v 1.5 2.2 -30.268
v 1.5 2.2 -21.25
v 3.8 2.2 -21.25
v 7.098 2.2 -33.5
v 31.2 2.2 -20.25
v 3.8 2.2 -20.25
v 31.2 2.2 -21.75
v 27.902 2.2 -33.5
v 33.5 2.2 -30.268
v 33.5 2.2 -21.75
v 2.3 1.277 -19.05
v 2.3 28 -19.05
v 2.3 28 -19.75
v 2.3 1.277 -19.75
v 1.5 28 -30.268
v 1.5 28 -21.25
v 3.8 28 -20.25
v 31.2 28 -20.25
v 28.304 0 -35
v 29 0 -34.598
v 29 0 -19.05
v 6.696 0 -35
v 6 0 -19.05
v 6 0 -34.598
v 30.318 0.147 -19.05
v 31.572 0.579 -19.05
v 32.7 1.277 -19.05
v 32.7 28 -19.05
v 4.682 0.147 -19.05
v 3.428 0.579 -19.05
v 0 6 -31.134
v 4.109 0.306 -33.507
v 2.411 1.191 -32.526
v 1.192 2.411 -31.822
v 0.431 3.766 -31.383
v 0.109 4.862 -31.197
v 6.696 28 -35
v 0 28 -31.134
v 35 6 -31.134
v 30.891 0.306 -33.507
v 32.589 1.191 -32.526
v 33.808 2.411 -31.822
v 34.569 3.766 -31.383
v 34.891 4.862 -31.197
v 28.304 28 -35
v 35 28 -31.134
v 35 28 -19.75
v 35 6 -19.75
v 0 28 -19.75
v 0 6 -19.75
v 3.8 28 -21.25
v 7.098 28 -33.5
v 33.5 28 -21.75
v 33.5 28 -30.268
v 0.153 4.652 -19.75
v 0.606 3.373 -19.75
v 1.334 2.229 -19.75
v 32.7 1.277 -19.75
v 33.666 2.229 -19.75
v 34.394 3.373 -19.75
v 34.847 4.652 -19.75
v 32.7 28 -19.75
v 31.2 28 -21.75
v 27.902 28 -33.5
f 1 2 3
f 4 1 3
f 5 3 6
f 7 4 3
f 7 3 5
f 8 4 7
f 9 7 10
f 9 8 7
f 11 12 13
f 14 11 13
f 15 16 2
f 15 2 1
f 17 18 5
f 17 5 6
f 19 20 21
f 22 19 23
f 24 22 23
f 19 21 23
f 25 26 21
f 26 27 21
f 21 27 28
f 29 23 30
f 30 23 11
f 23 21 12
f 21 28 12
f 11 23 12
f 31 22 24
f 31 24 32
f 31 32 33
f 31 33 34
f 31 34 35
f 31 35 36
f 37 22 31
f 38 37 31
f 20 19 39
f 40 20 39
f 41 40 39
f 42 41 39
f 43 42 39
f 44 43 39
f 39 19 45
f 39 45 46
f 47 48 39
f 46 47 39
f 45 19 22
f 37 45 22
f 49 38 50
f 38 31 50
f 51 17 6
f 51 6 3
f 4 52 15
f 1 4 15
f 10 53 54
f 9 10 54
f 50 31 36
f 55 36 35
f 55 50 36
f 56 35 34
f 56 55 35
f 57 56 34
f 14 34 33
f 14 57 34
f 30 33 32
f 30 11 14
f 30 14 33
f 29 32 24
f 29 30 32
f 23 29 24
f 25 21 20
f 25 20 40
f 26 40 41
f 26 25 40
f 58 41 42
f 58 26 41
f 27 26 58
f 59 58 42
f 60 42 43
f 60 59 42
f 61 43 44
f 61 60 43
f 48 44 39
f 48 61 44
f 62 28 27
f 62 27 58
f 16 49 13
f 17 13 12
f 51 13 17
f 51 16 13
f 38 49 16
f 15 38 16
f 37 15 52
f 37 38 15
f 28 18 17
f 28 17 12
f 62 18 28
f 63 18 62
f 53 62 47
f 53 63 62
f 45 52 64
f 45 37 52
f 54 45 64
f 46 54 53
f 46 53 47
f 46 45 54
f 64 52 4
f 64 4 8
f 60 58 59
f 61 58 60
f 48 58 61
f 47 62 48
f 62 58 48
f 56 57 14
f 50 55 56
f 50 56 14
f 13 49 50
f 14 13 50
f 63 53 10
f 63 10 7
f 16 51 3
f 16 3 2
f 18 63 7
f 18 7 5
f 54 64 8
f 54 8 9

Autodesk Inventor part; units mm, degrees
ref_plane "YZ Plane" through (0, 0, 0) normal (1, 0, 0) x (0, 1, 0)
ref_plane "XZ Plane" through (0, 0, 0) normal (0, 1, 0) x (-1, 0, 0)
ref_plane "XY Plane" through (0, 0, 0) normal (0, 0, 1) x (1, 0, 0)
sketch "Sketch1" plane through (0, 0, 0) normal (0, 1, 0) x (-1, 0, 0)
  line L0 (0, 0) -> (-35, 0)
  line L1 (-35, 0) -> (-35, -35)
  line L2 (-35, -35) -> (0, -35)
  line L3 (0, -35) -> (0, 0)
  dimension "d0" = 35
  dimension "d1" = 35
extrude "Extrusion1" add sketch "Sketch1" along normal blind 28
sketch "Sketch2" plane through (0, 28, 0) normal (0, 1, 0) x (1, 0, 0)
  line L0 (35, 19) -> (32.7, 19)
  line L1 (32.7, 19) -> (32.7, 17)
  line L2 (35, 19) -> (35, 17.125)
  line L3 (32.7, 17) -> (35, 17)
  line L4 (35, 17) -> (35, 17.125)
  point P0 (0, 0)
  point P1 (35, 35)
  dimension "d6" = 16
  dimension "d7" = 2.3
  dimension "d8" = 2
extrude "Extrusion2" cut sketch "Sketch2" against normal blind 28
pattern_linear "Rectangular Pattern1" count 2 spacing 32.7 along (-1, 0, 0) of "Extrusion2"
fillet "Fillet1" radius 6 2 edges at (35, 0, -8.5) (35, 0, -27)
fillet "Fillet2" radius 6 1 edges at (0, 0, -27)
sketch "Sketch3" plane through (0, 28, 0) normal (0, 1, 0) x (1, 0, 0)
  line L0 (6, 0) -> (0, 0) projected
  line L1 (0, 0) -> (0, 3)
  line L2 (0, 17) -> (0, 0) projected
  line L3 (0, 0) -> (3, 0)
  line L4 (0, 3) -> (3, 0)
  dimension "d16" = 3
extrude "Extrusion3" cut sketch "Sketch3" against normal blind 28
sketch "Sketch4" plane through (0, 28, 0) normal (0, 1, 0) x (1, 0, 0)
  line L0 (0, 19) -> (0, 35) projected
  line L1 (0, 35) -> (0, 32)
  line L2 (0, 35) -> (6, 35) projected
  line L3 (0, 35) -> (3, 35)
  line L4 (3, 35) -> (0, 32)
  point P0 (0, 0)
  dimension "d19" = 3
  dimension "d20" = 3
extrude "Extrusion4" cut sketch "Sketch4" against normal blind 28
sketch "Sketch5" plane through (0, 28, 0) normal (0, 1, 0) x (1, 0, 0)
  line L0 (35, 0) -> (35, 17) projected
  line L1 (35, 0) -> (32, 0)
  line L2 (3, 0) -> (35, 0) projected
  line L3 (35, 0) -> (35, 3)
  line L4 (35, 3) -> (32, 0)
  line L5 (29, 35) -> (35, 35) projected
  line L6 (35, 35) -> (35, 32)
  line L7 (35, 19) -> (35, 35) projected
  line L8 (35, 32) -> (32, 35)
  line L9 (32, 35) -> (35, 35)
  point P0 (0, 0)
  dimension "d23" = 3
  dimension "d24" = 3
  dimension "d25" = 3
extrude "Extrusion5" cut sketch "Sketch5" against normal blind 28
sketch "Sketch6" plane through (0, 28, 0) normal (0, 1, 0) x (1, 0, 0)
  line L0 (3, 0) -> (0, 3) projected
  line L1 (2.3, 17) -> (0, 17) projected
  line L2 (2, 15.75) -> (4.3, 15.75)
  line L3 (4.3, 15.75) -> (4.3, 21.75)
  line L4 (4.3, 21.75) -> (2, 21.75)
  line L5 (0, 19) -> (0, 32) projected
  line L6 (2, 21.75) -> (2, 30.75)
  line L7 (0, 3) -> (0, 5)
  line L8 (0, 17) -> (0, 3) projected
  line L9 (2, 5) -> (2, 15.75)
  line L10 (32, 35) -> (3, 35) projected
  line L11 (3, 35) -> (5, 35)
  line L12 (6, 0) -> (3, 0) projected
  line L13 (3, 0) -> (5, 0)
  line L14 (2.827, 3) -> (2, 3.8818)
  line L15 (2, 3.8818) -> (2, 5)
  line L16 (2.827, 3) -> (3.827, 2)
  line L17 (2.827, 3) -> (4.2412, 3) construction
  line L18 (1.743, 34.4232) -> (3.15, 33.0019)
  line L19 (3.15, 33.0019) -> (2, 31.8635)
  line L20 (2, 31.8635) -> (2, 30.75)
  line L21 (3.15, 33.0019) -> (4.0351, 33.5429)
  line L22 (4.0351, 33.5429) -> (30.1293, 33.5429)
  line L23 (35, 32) -> (32, 35) projected
  line L24 (32.0858, 32.8358) -> (31.3787, 33.5429)
  line L25 (31.3787, 33.5429) -> (30.1293, 33.5429)
  line L26 (35, 19) -> (35, 32) projected
  line L27 (33, 26.25) -> (33, 31.9216)
  line L28 (33, 31.9216) -> (32.0858, 32.8358)
  line L29 (33, 26.25) -> (33, 21.75)
  line L30 (35, 19) -> (32.7, 19) projected
  line L31 (33, 21.75) -> (30.7, 21.75)
  line L32 (30.7, 21.75) -> (30.7, 15.75)
  line L33 (30.7, 15.75) -> (33, 15.75)
  line L34 (33, 15.75) -> (33, 7.3052)
  line L35 (32, 0) -> (35, 3) projected
  line L36 (33.85, 1.85) -> (35.85, 1.85) construction
  line L37 (32.4358, 3.2642) -> (33, 3.8284)
  line L38 (33, 3.8284) -> (33, 7.3052)
  line L39 (27.667, 2) -> (31.1716, 2)
  line L40 (31.1716, 2) -> (32.4358, 3.2642)
  line L41 (27.667, 2) -> (3.827, 2)
  point P0 (0, 0)
  dimension "d31" = 2.3
  dimension "d32" = 6
  dimension "d33" = 2.3
  dimension "d34" = 9
  dimension "d35" = 2
  dimension "d36" = 2
  dimension "d37" = 2
  dimension "d42" = 45
  dimension "d43" = 2
  dimension "d48" = 4.5
  dimension "d49" = 2.3
  dimension "d50" = 6
  dimension "d51" = 2.3
  dimension "d52" = 2
extrude "Extrusion6" cut sketch "Sketch6" against normal blind 25.8
sketch "Sketch7" plane through (0, 28, 0) normal (0, 1, 0) x (1, 0, 0)
  line L0 (23.4542, 2) -> (23.9542, 2) construction
  line L1 (32.0858, 2.9142) -> (32.5858, 2.9142) construction
  line L2 (35, 32) -> (32, 35) projected
  line L3 (31.3787, 33.5429) -> (33, 31.9216) projected
  line L4 (2, 31.8635) -> (3.15, 33.0019) projected
  line L5 (2.8776, 32.7322) -> (3.3776, 32.7322) construction
  line L6 (32.4393, 2.5607) -> (31.3787, 1.5)
  line L7 (31.3787, 1.5) -> (23.4542, 1.5)
  line L8 (2.7741, 2.5108) -> (3.7848, 1.5)
  line L9 (3.7848, 1.5) -> (23.4542, 1.5)
  line L10 (2.7741, 2.5108) -> (1.5, 3.7848)
  line L11 (1.5, 3.7848) -> (1.5, 16.2498)
  line L12 (1.5, 16.2498) -> (3.8, 16.2498)
  line L13 (3.8, 16.2498) -> (3.8, 21.2498)
  line L14 (4.3, 21.75) -> (2, 21.75) projected
  line L15 (3.8, 21.2498) -> (1.5, 21.2498)
  line L16 (1.5, 21.2498) -> (1.5, 27.2918)
  line L17 (1.5, 27.2918) -> (1.5, 32.0617)
  line L18 (1.5, 32.0617) -> (2.5241, 33.0858)
  line L19 (2.5241, 33.0858) -> (3.4812, 34.0429)
  line L20 (3.4812, 34.0429) -> (18.3245, 34.0429)
  line L21 (18.3245, 34.0429) -> (31.5858, 34.0429)
  line L22 (31.5858, 34.0429) -> (32.5429, 33.0858)
  line L23 (32.4393, 2.5607) -> (33.5, 3.6213)
  line L24 (33.5, 3.6213) -> (33.5, 11.0333)
  line L25 (33.5, 11.0333) -> (33.5, 16.2503)
  line L26 (33.5, 16.2503) -> (31.2, 16.2503)
  line L27 (30.7, 21.75) -> (30.7, 15.75) projected
  line L28 (31.2, 16.2503) -> (31.2, 21.2503)
  line L29 (31.2, 21.2503) -> (33.5, 21.2503)
  line L30 (33.5, 21.2503) -> (33.5, 32.1287)
  line L31 (33.5, 32.1287) -> (32.5429, 33.0858)
  line L32 (4.0351, 33.5429) -> (31.3787, 33.5429) projected
  line L33 (4.0351, 33.5429) -> (31.3787, 33.5429)
  line L34 (33, 31.9216) -> (33, 21.75) projected
  line L35 (31.3787, 33.5429) -> (33, 31.9216)
  line L36 (33, 31.9216) -> (33, 21.75)
  line L37 (33, 21.75) -> (30.7, 21.75) projected
  line L38 (33, 21.75) -> (30.7, 21.75)
  line L39 (30.7, 21.75) -> (30.7, 15.75)
  line L40 (30.7, 15.75) -> (33, 15.75) projected
  line L41 (31.1716, 2) -> (3.827, 2)
  line L42 (3.827, 2) -> (2.827, 3) projected
  line L43 (2, 3.8818) -> (2, 15.75) projected
  line L44 (3.827, 2) -> (2, 3.8818)
  line L45 (2, 3.8818) -> (2, 15.75)
  line L46 (2, 15.75) -> (4.3, 15.75) projected
  line L47 (2, 15.75) -> (4.3, 15.75)
  line L48 (4.3, 15.75) -> (4.3, 21.75) projected
  line L49 (4.3, 15.75) -> (4.3, 21.75)
  line L50 (4.3, 21.75) -> (2, 21.75)
  line L51 (2, 21.75) -> (2, 31.8635) projected
  line L52 (2, 21.75) -> (2, 31.8635)
  line L53 (3.15, 33.0019) -> (4.0351, 33.5429) projected
  line L54 (2, 31.8635) -> (3.15, 33.0019)
  line L55 (33, 3.8284) -> (31.1716, 2) projected
  line L56 (31.1716, 2) -> (33, 3.8284)
  line L57 (33, 3.8284) -> (33, 15.75)
  line L58 (30.7, 15.75) -> (33, 15.75)
  point P0 (0, 0)
  dimension "d65" = 0.5
  dimension "d70" = 12.465
  dimension "d71" = 2.3
  dimension "d72" = 5
  dimension "d73" = 90
  dimension "d74" = 2.3
  dimension "d76" = 2.3
  dimension "d77" = 5
  dimension "d78" = 2.3
extrude "Extrusion7" cut sketch "Sketch7" against normal blind 25.8
sketch "Sketch8" plane through (0, 28, 0) normal (0, 1, 0) x (1, 0, 0)
  line L0 (32, 35) -> (35, 32) projected
  line L1 (33.2498, 33.7502) -> (34.7498, 33.7502) construction
  line L2 (29, 35) -> (32, 35) projected
  line L3 (28.3787, 33.5) -> (31.3787, 33.5)
  line L4 (31.3787, 33.5) -> (32.1892, 32.6895)
  line L5 (33.5, 32.1287) -> (33.5, 21.2503) projected
  line L6 (33.5, 31.3787) -> (32.1892, 32.6895)
  line L7 (33.5, 31.3787) -> (33.5, 32.1287)
  line L8 (31.5858, 34.0429) -> (33.5, 32.1287) projected
  line L9 (33.5, 32.1287) -> (31.5858, 34.0429)
  line L10 (3.4812, 34.0429) -> (31.5858, 34.0429) projected
  line L11 (31.5858, 34.0429) -> (3.4812, 34.0429)
  line L12 (1.5, 32.0617) -> (3.4812, 34.0429) projected
  line L13 (3.4812, 34.0429) -> (1.5, 32.0617)
  line L14 (3, 35) -> (0, 32) projected
  line L15 (1.7099, 33.7099) -> (3.2099, 33.7099) construction
  line L16 (2.7705, 32.6492) -> (1.5, 31.3787)
  line L17 (1.5, 21.2498) -> (1.5, 32.0617) projected
  line L18 (4.3449, 35) -> (5.8449, 35) construction
  line L19 (4.3449, 33.5) -> (3.6213, 33.5)
  line L20 (3.6213, 33.5) -> (2.7705, 32.6492)
  line L21 (1.5, 31.3787) -> (1.5, 32.0617)
  line L22 (4.3449, 33.5) -> (28.3787, 33.5)
  point P0 (0, 0)
  dimension "d83" = 1.5
  dimension "d87" = 1.5
  dimension "d89" = 1.5
extrude "Extrusion8" add sketch "Sketch8" against normal blind 25.8
sketch "Sketch9" plane through (0, 28, 0) normal (0, 1, 0) x (1, 0, 0)
  line L0 (0, 3) -> (3, 0) projected
  line L1 (0, 3) -> (5.1962, 0)
  line L2 (3, 0) -> (32, 0) projected
  line L3 (0, 3) -> (6, 3) construction
  line L4 (5.1962, 0) -> (3, 0)
  line L5 (3, 0) -> (0, 3)
  line L6 (35, 17) -> (35, 3) projected
  line L7 (35, 3) -> (29.8038, 0)
  line L8 (32, 0) -> (29, 0) projected
  line L9 (35, 3) -> (41, 3) construction
  line L10 (29.8038, 0) -> (32, 0)
  line L11 (32, 0) -> (35, 3)
  line L12 (35, 19) -> (35, 32) projected
  line L13 (35, 32) -> (29.8038, 35)
  line L14 (29, 35) -> (32, 35) projected
  line L15 (35, 32) -> (41, 32) construction
  line L16 (29.8038, 35) -> (32, 35)
  line L17 (32, 35) -> (35, 32)
  line L18 (0, 19) -> (0, 32) projected
  line L19 (0, 32) -> (5.1962, 35)
  line L20 (3, 35) -> (6, 35) projected
  line L21 (0, 32) -> (6, 32) construction
  line L22 (5.1962, 35) -> (3, 35)
  line L23 (3, 35) -> (0, 32)
  line L24 (0, 32) -> (3, 35) projected
  point P0 (0, 0)
  dimension "d93" = 30
  dimension "d94" = 150
  dimension "d95" = 150
  dimension "d96" = 30
extrude "Extrusion9" cut sketch "Sketch9" against normal blind 28
sketch "Sketch10" plane through (0, 28, 0) normal (0, 1, 0) x (1, 0, 0)
  line L0 (1.5, 3.7848) -> (1.5, 16.2498) projected
  line L1 (1.5, 3.7848) -> (5.4575, 1.5)
  line L2 (31.3787, 1.5) -> (3.7848, 1.5) projected
  line L3 (1.5, 3.7848) -> (6.0697, 3.7848) construction
  line L4 (5.4575, 1.5) -> (3.7848, 1.5)
  line L5 (3.7848, 1.5) -> (1.5, 3.7848) projected
  line L6 (3.7848, 1.5) -> (1.5, 3.7848)
  line L7 (33.5, 16.2503) -> (33.5, 3.6213) projected
  line L8 (33.5, 3.6213) -> (29.8258, 1.5)
  line L9 (33.5, 3.6213) -> (37.7426, 3.6213) construction
  line L10 (33.5, 3.6213) -> (31.3787, 1.5) projected
  line L11 (29.8258, 1.5) -> (31.3787, 1.5)
  line L12 (31.3787, 1.5) -> (33.5, 3.6213)
  line L13 (33.5, 31.3787) -> (33.5, 21.2503) projected
  line L14 (33.5, 31.3787) -> (29.8258, 33.5)
  line L15 (3.6213, 33.5) -> (31.3787, 33.5) projected
  line L16 (33.5, 31.3787) -> (37.7426, 31.3787) construction
  line L17 (29.8258, 33.5) -> (31.3787, 33.5)
  line L18 (31.3787, 33.5) -> (33.5, 31.3787)
  line L19 (1.5, 31.3787) -> (3.6213, 33.5) projected
  line L20 (1.5, 31.3787) -> (5.1742, 33.5)
  line L21 (1.5, 31.3787) -> (5.7426, 31.3787) construction
  line L22 (5.1742, 33.5) -> (3.6213, 33.5)
  line L23 (3.6213, 33.5) -> (1.5, 31.3787)
  point P0 (0, 0)
  dimension "d99" = 30
  dimension "d100" = 150
  dimension "d101" = 150
  dimension "d102" = 30
extrude "Extrusion10" add sketch "Sketch10" against normal blind 25.8
sketch "Sketch11" plane through (0, 28, 0) normal (0, 1, 0) x (1, 0, 0)
  line L0 (0, 3) -> (5.1962, 0) projected
  line L1 (3.036, 1.2472) -> (4.536, 1.2472) construction
  line L2 (3.786, 2.5462) -> (1.5, 3.866)
  line L3 (1.5, 3.7848) -> (5.4575, 1.5) projected
  line L4 (1.5, 3.866) -> (1.5, 3.7848)
  line L5 (1.5, 3.7848) -> (5.4575, 1.5)
  line L6 (5.4575, 1.5) -> (5.5981, 1.5)
  line L7 (29.8258, 1.5) -> (5.4575, 1.5) projected
  line L8 (5.5981, 1.5) -> (3.786, 2.5462)
  line L9 (29.5815, 1.5) -> (29.8258, 1.5)
  line L10 (33.5, 3.6213) -> (29.8258, 1.5) projected
  line L11 (29.8258, 1.5) -> (33.5, 3.6213)
  line L12 (29.8038, 0) -> (35, 3) projected
  line L13 (32.0253, 1.2826) -> (33.5253, 1.2826) construction
  line L14 (31.2753, 2.5816) -> (33.5, 3.866)
  line L15 (33.5, 16.2503) -> (33.5, 3.6213) projected
  line L16 (33.5, 3.866) -> (33.5, 3.6213)
  line L17 (31.2753, 2.5816) -> (29.4019, 1.5)
  line L18 (29.5815, 1.5) -> (29.4019, 1.5)
  line L19 (29.8038, 35) -> (35, 32) projected
  line L20 (29.8258, 33.5) -> (33.5, 31.3787) projected
  line L21 (32.0253, 33.7174) -> (33.5253, 33.7174) construction
  line L22 (31.2753, 32.4184) -> (29.4019, 33.5)
  line L23 (29.8258, 33.5) -> (5.1742, 33.5) projected
  line L24 (29.8258, 33.5) -> (29.4019, 33.5)
  line L25 (29.8258, 33.5) -> (33.5, 31.3787)
  line L26 (33.5, 31.3787) -> (33.5, 31.134)
  line L27 (33.5, 31.3787) -> (33.5, 21.2503) projected
  line L28 (31.2753, 32.4184) -> (33.5, 31.134)
  line L29 (5.1962, 35) -> (0, 32) projected
  line L30 (2.5981, 33.5) -> (4.0981, 33.5) construction
  line L31 (3.3481, 32.201) -> (1.606, 31.1952)
  line L32 (1.5, 21.2498) -> (1.5, 31.3787) projected
  line L33 (5.1742, 33.5) -> (1.5, 31.3787) projected
  line L34 (1.5, 31.3787) -> (5.1742, 33.5)
  line L35 (5.1742, 33.5) -> (5.5981, 33.5)
  line L36 (3.3481, 32.201) -> (5.5981, 33.5)
  line L37 (1.606, 31.1952) -> (1.5, 31.134)
  line L38 (1.5, 31.3787) -> (1.5, 31.134)
  point P0 (0, 0)
  dimension "d105" = 1.5
  dimension "d109" = 1.5
  dimension "d111" = 1.5
  dimension "d113" = 1.5
extrude "Extrusion11" add sketch "Sketch11" against normal blind 25.8
sketch "Sketch12" plane through (0, 28, 0) normal (0, 1, 0) x (1, 0, 0)
  line L0 (32.7, 19) -> (32.95, 19) construction
  line L1 (35, 19) -> (35, 32) projected
  line L2 (32.7, 19) -> (32.7, 17) projected
  line L3 (32.7, 19.25) -> (34.2, 19.25) construction
  line L4 (32.7, 20.75) -> (31.2, 20.75)
  line L5 (31.2, 21.2503) -> (31.2, 16.2503) projected
  line L6 (33.5, 21.2503) -> (31.2, 21.2503) projected
  line L7 (31.2, 21.2503) -> (31.2, 20.75)
  line L8 (33.5, 31.134) -> (33.5, 21.2503) projected
  line L9 (31.2, 21.2503) -> (33.5, 21.2503)
  line L10 (33.5, 21.2503) -> (33.5, 20.75)
  line L11 (33.5, 20.75) -> (32.7, 20.75)
  point P0 (0, 0)
  dimension "d117" = 0.25
  dimension "d119" = 1.5
extrude "Extrusion12" cut sketch "Sketch12" against normal blind 25.8
sketch "Sketch13" plane through (0, 28, 0) normal (0, 1, 0) x (1, 0, 0)
  line L0 (32.7, 19) -> (35, 19) projected
  line L1 (32.7, 19) -> (32.7, 19.25)
  line L2 (32.7, 19.25) -> (35, 19.25)
  line L3 (35, 19.25) -> (35, 19)
  line L4 (32.7, 17) -> (32.7, 19) projected
  line L5 (35, 19) -> (32.7, 19)
  point P0 (0, 0)
  dimension "d123" = 0.25
extrude "Extrusion13" cut sketch "Sketch13" against normal blind 28
sketch "Sketch14" plane through (0, 28, 0) normal (0, 1, 0) x (1, 0, 0)
  line L0 (32.7, 19.25) -> (35, 19.25) projected
  line L1 (32.7, 19.25) -> (32.7, 19.75)
  line L2 (32.7, 19.75) -> (35, 19.75)
  line L3 (35, 19.25) -> (35, 32) projected
  line L4 (35, 19.75) -> (35, 19.25)
  line L5 (32.7, 17) -> (32.7, 19.25) projected
  line L6 (35, 19.25) -> (32.7, 19.25)
  line L7 (0, 19) -> (2.3, 19) projected
  line L8 (0, 19) -> (0, 19.75)
  line L9 (0, 32) -> (0, 19) projected
  line L10 (0, 19.75) -> (2.3, 19.75)
  line L11 (2.3, 19) -> (2.3, 17) projected
  line L12 (2.3, 19.75) -> (2.3, 19)
  line L13 (2.3, 19) -> (0, 19)
  point P0 (0, 0)
  dimension "d129" = 0.5
  dimension "d130" = 0.75
extrude "Extrusion14" cut sketch "Sketch14" against normal blind 28
sketch "Sketch15" plane through (0, 28, 0) normal (0, 1, 0) x (1, 0, 0)
  line L0 (0, 19.75) -> (2.3, 19.75) projected
  line L1 (1.15, 17.75) -> (0, 17.75)
  line L2 (0, 17) -> (2.3, 17) projected
  line L3 (0, 17.75) -> (0, 17)
  line L4 (0, 17) -> (2.3, 17)
  line L5 (2.3, 19.75) -> (2.3, 17) projected
  line L6 (1.15, 17.75) -> (2.3, 17.75)
  line L7 (33.2558, 17.75) -> (32.7, 17.75)
  line L8 (32.7, 17) -> (35, 17)
  line L9 (35, 17) -> (35, 17.75)
  line L10 (35, 17.75) -> (33.2558, 17.75)
  line L11 (32.7, 17.75) -> (2.3, 17.75)
  line L12 (2.3, 17) -> (32.7, 17)
  point P0 (0, 0)
extrude "Extrusion15" add sketch "Sketch15" against normal blind 28
fillet "Fillet5" radius 6 2 edges at (35, 0, -17.375) (0, 0, -17.375)
sketch "Sketch16" plane through (0, 28, 0) normal (0, 1, 0) x (1, 0, 0)
  line L0 (3.8, 16.2498) -> (3.8, 17) projected
  line L1 (31.2, 17.75) -> (3.8, 17.75) projected
  line L2 (3.8, 17) -> (31.2, 17)
  line L3 (31.2, 17) -> (31.2, 17.75)
  line L4 (31.2, 17.75) -> (3.8, 17.75)
  line L5 (3.8, 17.75) -> (3.8, 17)
  point P0 (0, 0)
extrude "Extrusion16" cut sketch "Sketch16" against normal blind 25.8
sketch "Sketch17" plane through (0, 28, 0) normal (0, 1, 0) x (1, 0, 0)
  line L0 (33.5, 20.75) -> (31.2, 20.75) projected
  line L1 (33.5, 31.134) -> (33.5, 20.75) projected
  line L2 (31.2, 20.75) -> (33.5, 20.75)
  line L3 (33.5, 20.75) -> (33.5, 21.75)
  line L4 (33.5, 21.75) -> (31.2, 21.75)
  line L5 (31.2, 21.75) -> (31.2, 20.75)
  point P0 (0, 0)
  dimension "d144" = 1
extrude "Extrusion17" add sketch "Sketch17" against normal blind 25.8
sketch "Sketch18" plane through (0, 28, 0) normal (0, 1, 0) x (1, 0, 0)
  line L0 (31.2, 21.75) -> (31.2, 16.2503) projected
  line L1 (31.2, 18.25) -> (31.2, 19.25)
  line L2 (3.8, 16.2498) -> (3.8, 21.2498) projected
  line L3 (3.8, 18.25) -> (3.8, 19.25)
  line L4 (3.8, 19.25) -> (31.2, 19.25)
  line L5 (31.2, 18.25) -> (3.8, 18.25)
  point P0 (0, 0)
  point P1 (2.3, 17.75)
  dimension "d148" = 1
extrude "Extrusion18" add sketch "Sketch18" against normal blind 25.8
sketch "Sketch19" plane through (0, 28, 0) normal (0, 1, 0) x (1, 0, 0)
  line L0 (3.8, 18.25) -> (0, 18.25)
  line L1 (0, 18.25) -> (0, 0)
  line L2 (0, 0) -> (35, 0)
  line L3 (35, 0) -> (35, 18.25)
  line L4 (35, 17.75) -> (35, 3) projected
  line L5 (35, 18.25) -> (3.8, 18.25)
extrude "Extrusion19" cut sketch "Sketch19" against normal blind 28
sketch "Sketch20" plane through (0, 28, 0) normal (0, 1, 0) x (1, 0, 0)
  line L0 (3.8, 19.25) -> (3.8, 21.2498) projected
  line L1 (31.2, 21.75) -> (31.2, 19.25) projected
  line L2 (3.8, 19.25) -> (31.2, 19.25)
  line L3 (31.2, 19.25) -> (31.2, 19.75)
  line L4 (31.2, 19.75) -> (3.8, 19.75)
  line L5 (3.8, 19.75) -> (3.8, 19.25)
  point P0 (0, 0)
  dimension "d153" = 0.5
extrude "Extrusion20" add sketch "Sketch20" against normal blind 25.8
sketch "Sketch21" plane through (0, 28, 0) normal (0, 1, 0) x (1, 0, 0)
  line L0 (2.3, 18.25) -> (32.7, 18.25) projected
  line L1 (32.7, 19.75) -> (32.7, 18.25) projected
  line L2 (2.3, 18.25) -> (32.7, 18.25)
  line L3 (32.7, 18.25) -> (32.7, 18.75)
  line L4 (32.7, 18.75) -> (2.3, 18.75)
  line L5 (2.3, 18.75) -> (2.3, 18.25)
  point P0 (0, 0)
  dimension "d156" = 0.5
extrude "Extrusion21" cut sketch "Sketch21" against normal blind 28
sketch "Sketch22" plane through (0, 28, 0) normal (0, 1, 0) x (1, 0, 0)
  line L0 (31.2, 19.75) -> (3.8, 19.75) projected
  line L1 (31.2, 21.75) -> (31.2, 19.75) projected
  line L2 (3.8, 19.75) -> (31.2, 19.75)
  line L3 (31.2, 19.75) -> (31.2, 20.25)
  line L4 (31.2, 20.25) -> (3.8, 20.25)
  line L5 (3.8, 20.25) -> (3.8, 19.75)
  point P0 (0, 0)
  dimension "d159" = 0.5
extrude "Extrusion22" add sketch "Sketch22" against normal blind 25.8
sketch "Sketch23" plane through (0, 28, 0) normal (0, 1, 0) x (1, 0, 0)
  line L0 (29.8038, 35) -> (5.1962, 35) projected
  line L1 (5.1962, 35) -> (6.6962, 35)
  line L2 (6.6962, 35) -> (0, 31.134)
  line L3 (0, 19.75) -> (0, 32) projected
  line L4 (0, 31.134) -> (0, 32)
  line L5 (0, 32) -> (5.1962, 35)
  line L6 (29.8038, 35) -> (28.3038, 35)
  line L7 (28.3038, 35) -> (35, 31.134)
  line L8 (35, 19.75) -> (35, 32) projected
  line L9 (35, 31.134) -> (35, 32)
  line L10 (35, 32) -> (29.8038, 35)
  line L11 (2.3, 18.75) -> (32.7, 18.75) projected
  line L12 (32.7, 19.75) -> (32.7, 18.75) projected
  line L13 (2.3, 18.75) -> (32.7, 18.75)
  line L14 (32.7, 18.75) -> (32.7, 19.05)
  line L15 (32.7, 19.05) -> (2.3, 19.05)
  line L16 (2.3, 19.05) -> (2.3, 18.75)
  point P0 (0, 0)
  dimension "d164" = 1.5
  dimension "d165" = 30
  dimension "d166" = 1.5
  dimension "d167" = 30
  dimension "d168" = 0.3
extrude "Extrusion23" cut sketch "Sketch23" against normal blind 28
sketch "Sketch24" plane through (0, 28, 0) normal (0, 1, 0) x (1, 0, 0)
  line L0 (1.5, 31.134) -> (5.5981, 33.5) projected
  line L1 (5.5981, 33.5) -> (7.0981, 33.5)
  line L2 (29.4019, 33.5) -> (5.5981, 33.5) projected
  line L3 (7.0981, 33.5) -> (1.5, 30.2679)
  line L4 (1.5, 21.2498) -> (1.5, 31.134) projected
  line L5 (1.5, 30.2679) -> (1.5, 31.134)
  line L6 (1.5, 31.134) -> (5.5981, 33.5)
  line L7 (29.4019, 33.5) -> (33.5, 31.134) projected
  line L8 (29.4019, 33.5) -> (27.9019, 33.5)
  line L9 (27.9019, 33.5) -> (33.5, 30.2679)
  line L10 (33.5, 31.134) -> (33.5, 21.75) projected
  line L11 (33.5, 30.2679) -> (33.5, 31.134)
  line L12 (33.5, 31.134) -> (29.4019, 33.5)
  point P0 (0, 0)
  dimension "d171" = 1.5
  dimension "d172" = 30
  dimension "d173" = 1.5
  dimension "d174" = 30
extrude "Extrusion24" add sketch "Sketch24" against normal blind 25.8
properties part number "Sarten"
